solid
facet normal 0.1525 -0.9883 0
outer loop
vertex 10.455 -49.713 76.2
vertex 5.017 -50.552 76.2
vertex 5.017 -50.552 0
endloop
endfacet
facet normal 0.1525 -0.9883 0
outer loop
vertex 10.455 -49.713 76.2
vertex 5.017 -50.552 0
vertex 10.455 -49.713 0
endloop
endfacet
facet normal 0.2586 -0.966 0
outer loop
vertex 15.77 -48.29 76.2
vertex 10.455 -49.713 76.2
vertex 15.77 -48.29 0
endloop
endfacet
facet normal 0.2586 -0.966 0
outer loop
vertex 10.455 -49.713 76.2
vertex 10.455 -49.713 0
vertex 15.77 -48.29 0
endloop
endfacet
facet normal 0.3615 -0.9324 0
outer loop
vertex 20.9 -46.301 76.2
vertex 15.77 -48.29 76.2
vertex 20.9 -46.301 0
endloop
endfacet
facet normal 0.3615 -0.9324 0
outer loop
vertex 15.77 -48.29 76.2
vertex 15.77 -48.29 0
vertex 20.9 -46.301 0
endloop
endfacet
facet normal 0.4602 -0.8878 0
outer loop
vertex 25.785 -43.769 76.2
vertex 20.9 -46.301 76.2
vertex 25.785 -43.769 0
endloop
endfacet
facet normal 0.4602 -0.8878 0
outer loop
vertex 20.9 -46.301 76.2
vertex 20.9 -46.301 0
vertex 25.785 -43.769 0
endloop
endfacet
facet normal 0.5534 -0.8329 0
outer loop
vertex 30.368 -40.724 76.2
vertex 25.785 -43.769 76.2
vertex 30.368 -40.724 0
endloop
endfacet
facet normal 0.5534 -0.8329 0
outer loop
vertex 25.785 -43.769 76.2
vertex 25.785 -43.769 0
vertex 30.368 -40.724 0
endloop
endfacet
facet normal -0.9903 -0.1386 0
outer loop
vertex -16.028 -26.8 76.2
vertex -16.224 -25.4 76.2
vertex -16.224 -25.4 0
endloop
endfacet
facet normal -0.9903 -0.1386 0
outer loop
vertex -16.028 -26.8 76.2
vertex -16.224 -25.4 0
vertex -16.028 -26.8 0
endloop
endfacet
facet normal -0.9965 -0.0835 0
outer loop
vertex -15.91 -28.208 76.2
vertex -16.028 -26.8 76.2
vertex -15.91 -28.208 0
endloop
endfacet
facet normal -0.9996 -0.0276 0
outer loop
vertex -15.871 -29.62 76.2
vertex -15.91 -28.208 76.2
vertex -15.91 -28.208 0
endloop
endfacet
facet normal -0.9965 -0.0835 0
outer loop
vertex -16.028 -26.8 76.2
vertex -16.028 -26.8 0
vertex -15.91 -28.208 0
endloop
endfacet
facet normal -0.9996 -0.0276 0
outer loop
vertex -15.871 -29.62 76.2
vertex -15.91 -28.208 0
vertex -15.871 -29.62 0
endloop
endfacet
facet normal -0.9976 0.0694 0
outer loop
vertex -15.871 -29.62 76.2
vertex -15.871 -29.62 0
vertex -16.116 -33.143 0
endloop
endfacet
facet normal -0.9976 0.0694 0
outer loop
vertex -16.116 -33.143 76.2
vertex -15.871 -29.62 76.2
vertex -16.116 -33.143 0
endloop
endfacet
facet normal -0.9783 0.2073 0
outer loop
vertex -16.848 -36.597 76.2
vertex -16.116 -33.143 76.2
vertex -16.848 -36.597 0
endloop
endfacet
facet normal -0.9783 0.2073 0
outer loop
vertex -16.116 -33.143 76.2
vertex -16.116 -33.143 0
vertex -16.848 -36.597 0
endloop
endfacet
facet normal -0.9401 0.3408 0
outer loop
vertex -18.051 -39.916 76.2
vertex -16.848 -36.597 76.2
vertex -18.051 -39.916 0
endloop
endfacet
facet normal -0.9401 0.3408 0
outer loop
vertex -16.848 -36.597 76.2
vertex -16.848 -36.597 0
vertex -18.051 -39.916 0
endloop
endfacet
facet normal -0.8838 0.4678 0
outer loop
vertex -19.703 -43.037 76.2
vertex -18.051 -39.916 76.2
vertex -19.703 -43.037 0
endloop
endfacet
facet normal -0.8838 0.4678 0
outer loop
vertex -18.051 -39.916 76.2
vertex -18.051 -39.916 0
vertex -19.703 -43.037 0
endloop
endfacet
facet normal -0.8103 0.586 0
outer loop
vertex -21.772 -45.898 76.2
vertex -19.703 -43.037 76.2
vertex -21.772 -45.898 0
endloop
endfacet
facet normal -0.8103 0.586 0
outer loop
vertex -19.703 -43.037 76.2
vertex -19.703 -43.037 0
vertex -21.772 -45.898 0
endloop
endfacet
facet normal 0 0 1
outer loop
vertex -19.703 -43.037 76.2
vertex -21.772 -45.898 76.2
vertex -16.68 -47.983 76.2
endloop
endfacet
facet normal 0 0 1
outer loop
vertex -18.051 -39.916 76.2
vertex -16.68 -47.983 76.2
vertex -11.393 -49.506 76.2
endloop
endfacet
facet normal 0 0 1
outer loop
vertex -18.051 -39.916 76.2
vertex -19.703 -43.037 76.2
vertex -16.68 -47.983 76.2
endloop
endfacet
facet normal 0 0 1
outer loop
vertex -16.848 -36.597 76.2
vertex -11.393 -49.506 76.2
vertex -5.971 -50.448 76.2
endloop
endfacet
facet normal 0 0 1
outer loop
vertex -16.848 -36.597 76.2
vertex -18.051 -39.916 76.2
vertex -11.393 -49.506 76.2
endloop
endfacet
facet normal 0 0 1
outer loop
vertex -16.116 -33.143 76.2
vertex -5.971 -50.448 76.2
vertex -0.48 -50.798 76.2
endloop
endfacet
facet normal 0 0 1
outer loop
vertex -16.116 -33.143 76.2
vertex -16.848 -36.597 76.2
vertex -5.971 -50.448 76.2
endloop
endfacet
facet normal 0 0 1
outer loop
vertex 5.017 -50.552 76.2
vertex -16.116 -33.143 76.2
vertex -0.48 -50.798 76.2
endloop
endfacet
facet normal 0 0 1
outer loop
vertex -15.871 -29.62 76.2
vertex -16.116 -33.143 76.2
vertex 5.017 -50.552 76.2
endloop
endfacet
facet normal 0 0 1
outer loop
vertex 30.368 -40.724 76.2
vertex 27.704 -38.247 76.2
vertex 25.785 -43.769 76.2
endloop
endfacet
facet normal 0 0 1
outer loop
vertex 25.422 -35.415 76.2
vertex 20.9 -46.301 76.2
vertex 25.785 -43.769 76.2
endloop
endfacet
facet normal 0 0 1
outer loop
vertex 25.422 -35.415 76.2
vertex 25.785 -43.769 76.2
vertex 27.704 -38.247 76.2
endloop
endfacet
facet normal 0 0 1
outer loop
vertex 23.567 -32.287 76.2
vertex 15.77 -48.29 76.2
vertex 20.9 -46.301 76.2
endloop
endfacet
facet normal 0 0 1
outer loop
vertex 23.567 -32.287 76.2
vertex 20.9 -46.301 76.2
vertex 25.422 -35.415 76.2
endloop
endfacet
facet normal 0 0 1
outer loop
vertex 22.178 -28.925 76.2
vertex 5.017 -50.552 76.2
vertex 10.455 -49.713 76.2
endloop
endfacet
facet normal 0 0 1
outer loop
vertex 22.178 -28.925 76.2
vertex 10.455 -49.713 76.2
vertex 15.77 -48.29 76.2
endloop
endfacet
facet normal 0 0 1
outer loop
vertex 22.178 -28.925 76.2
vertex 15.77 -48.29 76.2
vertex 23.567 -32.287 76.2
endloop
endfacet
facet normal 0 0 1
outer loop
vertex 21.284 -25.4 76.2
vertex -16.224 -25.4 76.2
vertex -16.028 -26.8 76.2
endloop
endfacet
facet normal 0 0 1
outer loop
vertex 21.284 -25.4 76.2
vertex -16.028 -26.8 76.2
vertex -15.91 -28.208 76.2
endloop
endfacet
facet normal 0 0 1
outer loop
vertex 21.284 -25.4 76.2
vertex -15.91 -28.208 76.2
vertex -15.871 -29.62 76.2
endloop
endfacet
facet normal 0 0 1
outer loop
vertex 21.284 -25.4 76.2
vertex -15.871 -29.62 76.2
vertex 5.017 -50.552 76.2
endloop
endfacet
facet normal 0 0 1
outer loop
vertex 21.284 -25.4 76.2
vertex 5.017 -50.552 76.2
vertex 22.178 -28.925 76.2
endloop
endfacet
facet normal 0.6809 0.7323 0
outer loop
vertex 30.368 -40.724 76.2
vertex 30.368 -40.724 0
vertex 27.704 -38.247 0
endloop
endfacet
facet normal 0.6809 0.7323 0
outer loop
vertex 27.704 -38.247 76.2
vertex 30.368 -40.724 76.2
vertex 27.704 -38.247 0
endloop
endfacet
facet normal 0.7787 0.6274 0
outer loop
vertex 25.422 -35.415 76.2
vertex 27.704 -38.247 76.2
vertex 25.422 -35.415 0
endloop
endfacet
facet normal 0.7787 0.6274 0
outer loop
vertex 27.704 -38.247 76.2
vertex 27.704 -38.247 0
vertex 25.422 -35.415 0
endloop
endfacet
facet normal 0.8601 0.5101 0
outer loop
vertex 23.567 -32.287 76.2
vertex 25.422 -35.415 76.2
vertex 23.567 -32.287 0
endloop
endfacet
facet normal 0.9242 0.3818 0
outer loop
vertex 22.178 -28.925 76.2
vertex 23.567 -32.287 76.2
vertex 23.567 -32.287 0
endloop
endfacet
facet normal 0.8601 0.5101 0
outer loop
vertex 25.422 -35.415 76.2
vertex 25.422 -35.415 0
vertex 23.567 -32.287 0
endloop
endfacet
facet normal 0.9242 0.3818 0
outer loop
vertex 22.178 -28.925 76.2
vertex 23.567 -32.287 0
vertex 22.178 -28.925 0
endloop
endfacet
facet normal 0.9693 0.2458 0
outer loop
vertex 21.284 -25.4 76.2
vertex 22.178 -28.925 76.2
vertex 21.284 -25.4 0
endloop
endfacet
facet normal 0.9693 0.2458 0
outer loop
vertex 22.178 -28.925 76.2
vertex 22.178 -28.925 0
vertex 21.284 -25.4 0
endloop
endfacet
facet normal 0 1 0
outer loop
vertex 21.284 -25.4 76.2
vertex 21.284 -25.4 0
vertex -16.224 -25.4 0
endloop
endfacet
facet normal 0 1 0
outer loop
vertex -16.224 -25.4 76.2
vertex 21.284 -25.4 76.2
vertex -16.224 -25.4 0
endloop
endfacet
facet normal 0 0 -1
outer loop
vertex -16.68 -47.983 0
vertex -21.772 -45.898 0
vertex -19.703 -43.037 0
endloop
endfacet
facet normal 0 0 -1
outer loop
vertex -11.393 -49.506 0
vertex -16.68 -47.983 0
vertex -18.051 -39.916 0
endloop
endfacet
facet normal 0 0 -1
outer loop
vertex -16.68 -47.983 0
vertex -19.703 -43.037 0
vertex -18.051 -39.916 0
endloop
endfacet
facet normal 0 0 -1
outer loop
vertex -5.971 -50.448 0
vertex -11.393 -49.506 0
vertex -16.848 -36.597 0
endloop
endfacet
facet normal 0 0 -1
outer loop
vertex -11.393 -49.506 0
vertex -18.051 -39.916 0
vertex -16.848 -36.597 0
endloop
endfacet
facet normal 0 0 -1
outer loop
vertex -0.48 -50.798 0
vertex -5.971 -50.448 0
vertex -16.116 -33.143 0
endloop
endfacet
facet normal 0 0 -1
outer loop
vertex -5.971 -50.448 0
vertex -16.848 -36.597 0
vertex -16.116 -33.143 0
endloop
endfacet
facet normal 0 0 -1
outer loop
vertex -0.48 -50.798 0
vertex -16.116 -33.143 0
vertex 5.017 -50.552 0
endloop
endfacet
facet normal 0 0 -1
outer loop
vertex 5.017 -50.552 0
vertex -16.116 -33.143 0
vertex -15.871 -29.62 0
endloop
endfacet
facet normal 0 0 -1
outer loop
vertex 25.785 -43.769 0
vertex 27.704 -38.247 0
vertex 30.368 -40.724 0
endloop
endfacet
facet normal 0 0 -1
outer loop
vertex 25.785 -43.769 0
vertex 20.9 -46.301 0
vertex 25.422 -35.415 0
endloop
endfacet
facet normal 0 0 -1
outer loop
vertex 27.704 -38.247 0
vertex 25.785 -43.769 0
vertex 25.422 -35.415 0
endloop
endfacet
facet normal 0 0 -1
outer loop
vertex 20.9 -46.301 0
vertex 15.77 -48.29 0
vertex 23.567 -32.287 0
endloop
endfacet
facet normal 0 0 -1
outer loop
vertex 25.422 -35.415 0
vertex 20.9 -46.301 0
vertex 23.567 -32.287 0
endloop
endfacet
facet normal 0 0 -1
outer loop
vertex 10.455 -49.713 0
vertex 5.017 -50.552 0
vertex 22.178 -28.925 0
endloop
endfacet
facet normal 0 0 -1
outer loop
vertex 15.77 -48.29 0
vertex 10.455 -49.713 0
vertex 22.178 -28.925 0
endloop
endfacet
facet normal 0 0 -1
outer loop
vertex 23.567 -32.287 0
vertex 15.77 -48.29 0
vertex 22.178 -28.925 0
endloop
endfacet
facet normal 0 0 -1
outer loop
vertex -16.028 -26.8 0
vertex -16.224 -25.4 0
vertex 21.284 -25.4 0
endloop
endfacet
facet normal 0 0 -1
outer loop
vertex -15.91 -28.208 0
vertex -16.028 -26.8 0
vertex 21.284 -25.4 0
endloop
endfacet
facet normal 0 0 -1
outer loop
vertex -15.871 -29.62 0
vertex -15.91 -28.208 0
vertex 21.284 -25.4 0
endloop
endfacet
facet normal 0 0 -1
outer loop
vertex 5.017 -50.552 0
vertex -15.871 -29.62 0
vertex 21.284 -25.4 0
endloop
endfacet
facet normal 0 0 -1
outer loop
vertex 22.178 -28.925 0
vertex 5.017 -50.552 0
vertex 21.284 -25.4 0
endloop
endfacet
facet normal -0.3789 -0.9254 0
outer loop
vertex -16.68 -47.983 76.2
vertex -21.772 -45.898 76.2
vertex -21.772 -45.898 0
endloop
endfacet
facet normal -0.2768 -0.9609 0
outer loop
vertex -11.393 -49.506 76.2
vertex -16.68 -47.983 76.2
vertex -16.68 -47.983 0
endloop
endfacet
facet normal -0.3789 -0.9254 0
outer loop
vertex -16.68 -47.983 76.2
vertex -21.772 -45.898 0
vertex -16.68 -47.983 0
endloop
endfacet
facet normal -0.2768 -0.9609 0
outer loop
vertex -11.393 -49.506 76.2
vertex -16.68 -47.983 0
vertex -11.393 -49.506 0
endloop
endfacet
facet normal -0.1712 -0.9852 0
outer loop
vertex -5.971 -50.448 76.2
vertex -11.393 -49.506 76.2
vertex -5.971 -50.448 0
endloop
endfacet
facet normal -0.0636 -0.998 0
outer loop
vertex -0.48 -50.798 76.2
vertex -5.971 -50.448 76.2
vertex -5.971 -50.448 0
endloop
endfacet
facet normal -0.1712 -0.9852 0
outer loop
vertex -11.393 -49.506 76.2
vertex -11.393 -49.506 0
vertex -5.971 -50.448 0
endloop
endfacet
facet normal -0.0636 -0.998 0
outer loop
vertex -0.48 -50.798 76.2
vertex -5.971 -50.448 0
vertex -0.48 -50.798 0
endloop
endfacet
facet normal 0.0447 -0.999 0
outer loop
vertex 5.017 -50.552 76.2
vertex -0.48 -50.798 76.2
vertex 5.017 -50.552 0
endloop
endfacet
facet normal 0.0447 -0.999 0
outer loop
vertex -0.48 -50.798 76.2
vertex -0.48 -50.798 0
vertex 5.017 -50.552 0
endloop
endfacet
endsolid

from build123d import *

# Parameters (mm, degrees)
F1_DEPTH = 76.2


with BuildPart() as f1:
    # F0 (on Top) → F1 (new body)
    with BuildSketch(Plane.XY):
        with BuildLine():
            ThreePointArc((5.0166433221, -50.5516892871), (18.3621332827, -47.3653044043), (30.3681236725, -40.7236671312))
            ThreePointArc((30.3681236725, -40.7236671312), (24.4383893444, -33.8843769742), (21.2835539426, -25.4))
            Line((21.2835539426, -25.4), (-16.2238025261, -25.4))
            ThreePointArc((-16.2238025261, -25.4), (-15.9591486415, -27.5028208782), (-15.8707254658, -29.6203852022))
            ThreePointArc((-15.8707254658, -29.6203852022), (-17.3915692894, -38.277515229), (-21.771977458, -45.8979411038))
            ThreePointArc((-21.771977458, -45.8979411038), (-8.6948058368, -50.050378135), (5.0166433221, -50.5516892871))
        make_face()
    extrude(amount=F1_DEPTH)


solid = f1.part
